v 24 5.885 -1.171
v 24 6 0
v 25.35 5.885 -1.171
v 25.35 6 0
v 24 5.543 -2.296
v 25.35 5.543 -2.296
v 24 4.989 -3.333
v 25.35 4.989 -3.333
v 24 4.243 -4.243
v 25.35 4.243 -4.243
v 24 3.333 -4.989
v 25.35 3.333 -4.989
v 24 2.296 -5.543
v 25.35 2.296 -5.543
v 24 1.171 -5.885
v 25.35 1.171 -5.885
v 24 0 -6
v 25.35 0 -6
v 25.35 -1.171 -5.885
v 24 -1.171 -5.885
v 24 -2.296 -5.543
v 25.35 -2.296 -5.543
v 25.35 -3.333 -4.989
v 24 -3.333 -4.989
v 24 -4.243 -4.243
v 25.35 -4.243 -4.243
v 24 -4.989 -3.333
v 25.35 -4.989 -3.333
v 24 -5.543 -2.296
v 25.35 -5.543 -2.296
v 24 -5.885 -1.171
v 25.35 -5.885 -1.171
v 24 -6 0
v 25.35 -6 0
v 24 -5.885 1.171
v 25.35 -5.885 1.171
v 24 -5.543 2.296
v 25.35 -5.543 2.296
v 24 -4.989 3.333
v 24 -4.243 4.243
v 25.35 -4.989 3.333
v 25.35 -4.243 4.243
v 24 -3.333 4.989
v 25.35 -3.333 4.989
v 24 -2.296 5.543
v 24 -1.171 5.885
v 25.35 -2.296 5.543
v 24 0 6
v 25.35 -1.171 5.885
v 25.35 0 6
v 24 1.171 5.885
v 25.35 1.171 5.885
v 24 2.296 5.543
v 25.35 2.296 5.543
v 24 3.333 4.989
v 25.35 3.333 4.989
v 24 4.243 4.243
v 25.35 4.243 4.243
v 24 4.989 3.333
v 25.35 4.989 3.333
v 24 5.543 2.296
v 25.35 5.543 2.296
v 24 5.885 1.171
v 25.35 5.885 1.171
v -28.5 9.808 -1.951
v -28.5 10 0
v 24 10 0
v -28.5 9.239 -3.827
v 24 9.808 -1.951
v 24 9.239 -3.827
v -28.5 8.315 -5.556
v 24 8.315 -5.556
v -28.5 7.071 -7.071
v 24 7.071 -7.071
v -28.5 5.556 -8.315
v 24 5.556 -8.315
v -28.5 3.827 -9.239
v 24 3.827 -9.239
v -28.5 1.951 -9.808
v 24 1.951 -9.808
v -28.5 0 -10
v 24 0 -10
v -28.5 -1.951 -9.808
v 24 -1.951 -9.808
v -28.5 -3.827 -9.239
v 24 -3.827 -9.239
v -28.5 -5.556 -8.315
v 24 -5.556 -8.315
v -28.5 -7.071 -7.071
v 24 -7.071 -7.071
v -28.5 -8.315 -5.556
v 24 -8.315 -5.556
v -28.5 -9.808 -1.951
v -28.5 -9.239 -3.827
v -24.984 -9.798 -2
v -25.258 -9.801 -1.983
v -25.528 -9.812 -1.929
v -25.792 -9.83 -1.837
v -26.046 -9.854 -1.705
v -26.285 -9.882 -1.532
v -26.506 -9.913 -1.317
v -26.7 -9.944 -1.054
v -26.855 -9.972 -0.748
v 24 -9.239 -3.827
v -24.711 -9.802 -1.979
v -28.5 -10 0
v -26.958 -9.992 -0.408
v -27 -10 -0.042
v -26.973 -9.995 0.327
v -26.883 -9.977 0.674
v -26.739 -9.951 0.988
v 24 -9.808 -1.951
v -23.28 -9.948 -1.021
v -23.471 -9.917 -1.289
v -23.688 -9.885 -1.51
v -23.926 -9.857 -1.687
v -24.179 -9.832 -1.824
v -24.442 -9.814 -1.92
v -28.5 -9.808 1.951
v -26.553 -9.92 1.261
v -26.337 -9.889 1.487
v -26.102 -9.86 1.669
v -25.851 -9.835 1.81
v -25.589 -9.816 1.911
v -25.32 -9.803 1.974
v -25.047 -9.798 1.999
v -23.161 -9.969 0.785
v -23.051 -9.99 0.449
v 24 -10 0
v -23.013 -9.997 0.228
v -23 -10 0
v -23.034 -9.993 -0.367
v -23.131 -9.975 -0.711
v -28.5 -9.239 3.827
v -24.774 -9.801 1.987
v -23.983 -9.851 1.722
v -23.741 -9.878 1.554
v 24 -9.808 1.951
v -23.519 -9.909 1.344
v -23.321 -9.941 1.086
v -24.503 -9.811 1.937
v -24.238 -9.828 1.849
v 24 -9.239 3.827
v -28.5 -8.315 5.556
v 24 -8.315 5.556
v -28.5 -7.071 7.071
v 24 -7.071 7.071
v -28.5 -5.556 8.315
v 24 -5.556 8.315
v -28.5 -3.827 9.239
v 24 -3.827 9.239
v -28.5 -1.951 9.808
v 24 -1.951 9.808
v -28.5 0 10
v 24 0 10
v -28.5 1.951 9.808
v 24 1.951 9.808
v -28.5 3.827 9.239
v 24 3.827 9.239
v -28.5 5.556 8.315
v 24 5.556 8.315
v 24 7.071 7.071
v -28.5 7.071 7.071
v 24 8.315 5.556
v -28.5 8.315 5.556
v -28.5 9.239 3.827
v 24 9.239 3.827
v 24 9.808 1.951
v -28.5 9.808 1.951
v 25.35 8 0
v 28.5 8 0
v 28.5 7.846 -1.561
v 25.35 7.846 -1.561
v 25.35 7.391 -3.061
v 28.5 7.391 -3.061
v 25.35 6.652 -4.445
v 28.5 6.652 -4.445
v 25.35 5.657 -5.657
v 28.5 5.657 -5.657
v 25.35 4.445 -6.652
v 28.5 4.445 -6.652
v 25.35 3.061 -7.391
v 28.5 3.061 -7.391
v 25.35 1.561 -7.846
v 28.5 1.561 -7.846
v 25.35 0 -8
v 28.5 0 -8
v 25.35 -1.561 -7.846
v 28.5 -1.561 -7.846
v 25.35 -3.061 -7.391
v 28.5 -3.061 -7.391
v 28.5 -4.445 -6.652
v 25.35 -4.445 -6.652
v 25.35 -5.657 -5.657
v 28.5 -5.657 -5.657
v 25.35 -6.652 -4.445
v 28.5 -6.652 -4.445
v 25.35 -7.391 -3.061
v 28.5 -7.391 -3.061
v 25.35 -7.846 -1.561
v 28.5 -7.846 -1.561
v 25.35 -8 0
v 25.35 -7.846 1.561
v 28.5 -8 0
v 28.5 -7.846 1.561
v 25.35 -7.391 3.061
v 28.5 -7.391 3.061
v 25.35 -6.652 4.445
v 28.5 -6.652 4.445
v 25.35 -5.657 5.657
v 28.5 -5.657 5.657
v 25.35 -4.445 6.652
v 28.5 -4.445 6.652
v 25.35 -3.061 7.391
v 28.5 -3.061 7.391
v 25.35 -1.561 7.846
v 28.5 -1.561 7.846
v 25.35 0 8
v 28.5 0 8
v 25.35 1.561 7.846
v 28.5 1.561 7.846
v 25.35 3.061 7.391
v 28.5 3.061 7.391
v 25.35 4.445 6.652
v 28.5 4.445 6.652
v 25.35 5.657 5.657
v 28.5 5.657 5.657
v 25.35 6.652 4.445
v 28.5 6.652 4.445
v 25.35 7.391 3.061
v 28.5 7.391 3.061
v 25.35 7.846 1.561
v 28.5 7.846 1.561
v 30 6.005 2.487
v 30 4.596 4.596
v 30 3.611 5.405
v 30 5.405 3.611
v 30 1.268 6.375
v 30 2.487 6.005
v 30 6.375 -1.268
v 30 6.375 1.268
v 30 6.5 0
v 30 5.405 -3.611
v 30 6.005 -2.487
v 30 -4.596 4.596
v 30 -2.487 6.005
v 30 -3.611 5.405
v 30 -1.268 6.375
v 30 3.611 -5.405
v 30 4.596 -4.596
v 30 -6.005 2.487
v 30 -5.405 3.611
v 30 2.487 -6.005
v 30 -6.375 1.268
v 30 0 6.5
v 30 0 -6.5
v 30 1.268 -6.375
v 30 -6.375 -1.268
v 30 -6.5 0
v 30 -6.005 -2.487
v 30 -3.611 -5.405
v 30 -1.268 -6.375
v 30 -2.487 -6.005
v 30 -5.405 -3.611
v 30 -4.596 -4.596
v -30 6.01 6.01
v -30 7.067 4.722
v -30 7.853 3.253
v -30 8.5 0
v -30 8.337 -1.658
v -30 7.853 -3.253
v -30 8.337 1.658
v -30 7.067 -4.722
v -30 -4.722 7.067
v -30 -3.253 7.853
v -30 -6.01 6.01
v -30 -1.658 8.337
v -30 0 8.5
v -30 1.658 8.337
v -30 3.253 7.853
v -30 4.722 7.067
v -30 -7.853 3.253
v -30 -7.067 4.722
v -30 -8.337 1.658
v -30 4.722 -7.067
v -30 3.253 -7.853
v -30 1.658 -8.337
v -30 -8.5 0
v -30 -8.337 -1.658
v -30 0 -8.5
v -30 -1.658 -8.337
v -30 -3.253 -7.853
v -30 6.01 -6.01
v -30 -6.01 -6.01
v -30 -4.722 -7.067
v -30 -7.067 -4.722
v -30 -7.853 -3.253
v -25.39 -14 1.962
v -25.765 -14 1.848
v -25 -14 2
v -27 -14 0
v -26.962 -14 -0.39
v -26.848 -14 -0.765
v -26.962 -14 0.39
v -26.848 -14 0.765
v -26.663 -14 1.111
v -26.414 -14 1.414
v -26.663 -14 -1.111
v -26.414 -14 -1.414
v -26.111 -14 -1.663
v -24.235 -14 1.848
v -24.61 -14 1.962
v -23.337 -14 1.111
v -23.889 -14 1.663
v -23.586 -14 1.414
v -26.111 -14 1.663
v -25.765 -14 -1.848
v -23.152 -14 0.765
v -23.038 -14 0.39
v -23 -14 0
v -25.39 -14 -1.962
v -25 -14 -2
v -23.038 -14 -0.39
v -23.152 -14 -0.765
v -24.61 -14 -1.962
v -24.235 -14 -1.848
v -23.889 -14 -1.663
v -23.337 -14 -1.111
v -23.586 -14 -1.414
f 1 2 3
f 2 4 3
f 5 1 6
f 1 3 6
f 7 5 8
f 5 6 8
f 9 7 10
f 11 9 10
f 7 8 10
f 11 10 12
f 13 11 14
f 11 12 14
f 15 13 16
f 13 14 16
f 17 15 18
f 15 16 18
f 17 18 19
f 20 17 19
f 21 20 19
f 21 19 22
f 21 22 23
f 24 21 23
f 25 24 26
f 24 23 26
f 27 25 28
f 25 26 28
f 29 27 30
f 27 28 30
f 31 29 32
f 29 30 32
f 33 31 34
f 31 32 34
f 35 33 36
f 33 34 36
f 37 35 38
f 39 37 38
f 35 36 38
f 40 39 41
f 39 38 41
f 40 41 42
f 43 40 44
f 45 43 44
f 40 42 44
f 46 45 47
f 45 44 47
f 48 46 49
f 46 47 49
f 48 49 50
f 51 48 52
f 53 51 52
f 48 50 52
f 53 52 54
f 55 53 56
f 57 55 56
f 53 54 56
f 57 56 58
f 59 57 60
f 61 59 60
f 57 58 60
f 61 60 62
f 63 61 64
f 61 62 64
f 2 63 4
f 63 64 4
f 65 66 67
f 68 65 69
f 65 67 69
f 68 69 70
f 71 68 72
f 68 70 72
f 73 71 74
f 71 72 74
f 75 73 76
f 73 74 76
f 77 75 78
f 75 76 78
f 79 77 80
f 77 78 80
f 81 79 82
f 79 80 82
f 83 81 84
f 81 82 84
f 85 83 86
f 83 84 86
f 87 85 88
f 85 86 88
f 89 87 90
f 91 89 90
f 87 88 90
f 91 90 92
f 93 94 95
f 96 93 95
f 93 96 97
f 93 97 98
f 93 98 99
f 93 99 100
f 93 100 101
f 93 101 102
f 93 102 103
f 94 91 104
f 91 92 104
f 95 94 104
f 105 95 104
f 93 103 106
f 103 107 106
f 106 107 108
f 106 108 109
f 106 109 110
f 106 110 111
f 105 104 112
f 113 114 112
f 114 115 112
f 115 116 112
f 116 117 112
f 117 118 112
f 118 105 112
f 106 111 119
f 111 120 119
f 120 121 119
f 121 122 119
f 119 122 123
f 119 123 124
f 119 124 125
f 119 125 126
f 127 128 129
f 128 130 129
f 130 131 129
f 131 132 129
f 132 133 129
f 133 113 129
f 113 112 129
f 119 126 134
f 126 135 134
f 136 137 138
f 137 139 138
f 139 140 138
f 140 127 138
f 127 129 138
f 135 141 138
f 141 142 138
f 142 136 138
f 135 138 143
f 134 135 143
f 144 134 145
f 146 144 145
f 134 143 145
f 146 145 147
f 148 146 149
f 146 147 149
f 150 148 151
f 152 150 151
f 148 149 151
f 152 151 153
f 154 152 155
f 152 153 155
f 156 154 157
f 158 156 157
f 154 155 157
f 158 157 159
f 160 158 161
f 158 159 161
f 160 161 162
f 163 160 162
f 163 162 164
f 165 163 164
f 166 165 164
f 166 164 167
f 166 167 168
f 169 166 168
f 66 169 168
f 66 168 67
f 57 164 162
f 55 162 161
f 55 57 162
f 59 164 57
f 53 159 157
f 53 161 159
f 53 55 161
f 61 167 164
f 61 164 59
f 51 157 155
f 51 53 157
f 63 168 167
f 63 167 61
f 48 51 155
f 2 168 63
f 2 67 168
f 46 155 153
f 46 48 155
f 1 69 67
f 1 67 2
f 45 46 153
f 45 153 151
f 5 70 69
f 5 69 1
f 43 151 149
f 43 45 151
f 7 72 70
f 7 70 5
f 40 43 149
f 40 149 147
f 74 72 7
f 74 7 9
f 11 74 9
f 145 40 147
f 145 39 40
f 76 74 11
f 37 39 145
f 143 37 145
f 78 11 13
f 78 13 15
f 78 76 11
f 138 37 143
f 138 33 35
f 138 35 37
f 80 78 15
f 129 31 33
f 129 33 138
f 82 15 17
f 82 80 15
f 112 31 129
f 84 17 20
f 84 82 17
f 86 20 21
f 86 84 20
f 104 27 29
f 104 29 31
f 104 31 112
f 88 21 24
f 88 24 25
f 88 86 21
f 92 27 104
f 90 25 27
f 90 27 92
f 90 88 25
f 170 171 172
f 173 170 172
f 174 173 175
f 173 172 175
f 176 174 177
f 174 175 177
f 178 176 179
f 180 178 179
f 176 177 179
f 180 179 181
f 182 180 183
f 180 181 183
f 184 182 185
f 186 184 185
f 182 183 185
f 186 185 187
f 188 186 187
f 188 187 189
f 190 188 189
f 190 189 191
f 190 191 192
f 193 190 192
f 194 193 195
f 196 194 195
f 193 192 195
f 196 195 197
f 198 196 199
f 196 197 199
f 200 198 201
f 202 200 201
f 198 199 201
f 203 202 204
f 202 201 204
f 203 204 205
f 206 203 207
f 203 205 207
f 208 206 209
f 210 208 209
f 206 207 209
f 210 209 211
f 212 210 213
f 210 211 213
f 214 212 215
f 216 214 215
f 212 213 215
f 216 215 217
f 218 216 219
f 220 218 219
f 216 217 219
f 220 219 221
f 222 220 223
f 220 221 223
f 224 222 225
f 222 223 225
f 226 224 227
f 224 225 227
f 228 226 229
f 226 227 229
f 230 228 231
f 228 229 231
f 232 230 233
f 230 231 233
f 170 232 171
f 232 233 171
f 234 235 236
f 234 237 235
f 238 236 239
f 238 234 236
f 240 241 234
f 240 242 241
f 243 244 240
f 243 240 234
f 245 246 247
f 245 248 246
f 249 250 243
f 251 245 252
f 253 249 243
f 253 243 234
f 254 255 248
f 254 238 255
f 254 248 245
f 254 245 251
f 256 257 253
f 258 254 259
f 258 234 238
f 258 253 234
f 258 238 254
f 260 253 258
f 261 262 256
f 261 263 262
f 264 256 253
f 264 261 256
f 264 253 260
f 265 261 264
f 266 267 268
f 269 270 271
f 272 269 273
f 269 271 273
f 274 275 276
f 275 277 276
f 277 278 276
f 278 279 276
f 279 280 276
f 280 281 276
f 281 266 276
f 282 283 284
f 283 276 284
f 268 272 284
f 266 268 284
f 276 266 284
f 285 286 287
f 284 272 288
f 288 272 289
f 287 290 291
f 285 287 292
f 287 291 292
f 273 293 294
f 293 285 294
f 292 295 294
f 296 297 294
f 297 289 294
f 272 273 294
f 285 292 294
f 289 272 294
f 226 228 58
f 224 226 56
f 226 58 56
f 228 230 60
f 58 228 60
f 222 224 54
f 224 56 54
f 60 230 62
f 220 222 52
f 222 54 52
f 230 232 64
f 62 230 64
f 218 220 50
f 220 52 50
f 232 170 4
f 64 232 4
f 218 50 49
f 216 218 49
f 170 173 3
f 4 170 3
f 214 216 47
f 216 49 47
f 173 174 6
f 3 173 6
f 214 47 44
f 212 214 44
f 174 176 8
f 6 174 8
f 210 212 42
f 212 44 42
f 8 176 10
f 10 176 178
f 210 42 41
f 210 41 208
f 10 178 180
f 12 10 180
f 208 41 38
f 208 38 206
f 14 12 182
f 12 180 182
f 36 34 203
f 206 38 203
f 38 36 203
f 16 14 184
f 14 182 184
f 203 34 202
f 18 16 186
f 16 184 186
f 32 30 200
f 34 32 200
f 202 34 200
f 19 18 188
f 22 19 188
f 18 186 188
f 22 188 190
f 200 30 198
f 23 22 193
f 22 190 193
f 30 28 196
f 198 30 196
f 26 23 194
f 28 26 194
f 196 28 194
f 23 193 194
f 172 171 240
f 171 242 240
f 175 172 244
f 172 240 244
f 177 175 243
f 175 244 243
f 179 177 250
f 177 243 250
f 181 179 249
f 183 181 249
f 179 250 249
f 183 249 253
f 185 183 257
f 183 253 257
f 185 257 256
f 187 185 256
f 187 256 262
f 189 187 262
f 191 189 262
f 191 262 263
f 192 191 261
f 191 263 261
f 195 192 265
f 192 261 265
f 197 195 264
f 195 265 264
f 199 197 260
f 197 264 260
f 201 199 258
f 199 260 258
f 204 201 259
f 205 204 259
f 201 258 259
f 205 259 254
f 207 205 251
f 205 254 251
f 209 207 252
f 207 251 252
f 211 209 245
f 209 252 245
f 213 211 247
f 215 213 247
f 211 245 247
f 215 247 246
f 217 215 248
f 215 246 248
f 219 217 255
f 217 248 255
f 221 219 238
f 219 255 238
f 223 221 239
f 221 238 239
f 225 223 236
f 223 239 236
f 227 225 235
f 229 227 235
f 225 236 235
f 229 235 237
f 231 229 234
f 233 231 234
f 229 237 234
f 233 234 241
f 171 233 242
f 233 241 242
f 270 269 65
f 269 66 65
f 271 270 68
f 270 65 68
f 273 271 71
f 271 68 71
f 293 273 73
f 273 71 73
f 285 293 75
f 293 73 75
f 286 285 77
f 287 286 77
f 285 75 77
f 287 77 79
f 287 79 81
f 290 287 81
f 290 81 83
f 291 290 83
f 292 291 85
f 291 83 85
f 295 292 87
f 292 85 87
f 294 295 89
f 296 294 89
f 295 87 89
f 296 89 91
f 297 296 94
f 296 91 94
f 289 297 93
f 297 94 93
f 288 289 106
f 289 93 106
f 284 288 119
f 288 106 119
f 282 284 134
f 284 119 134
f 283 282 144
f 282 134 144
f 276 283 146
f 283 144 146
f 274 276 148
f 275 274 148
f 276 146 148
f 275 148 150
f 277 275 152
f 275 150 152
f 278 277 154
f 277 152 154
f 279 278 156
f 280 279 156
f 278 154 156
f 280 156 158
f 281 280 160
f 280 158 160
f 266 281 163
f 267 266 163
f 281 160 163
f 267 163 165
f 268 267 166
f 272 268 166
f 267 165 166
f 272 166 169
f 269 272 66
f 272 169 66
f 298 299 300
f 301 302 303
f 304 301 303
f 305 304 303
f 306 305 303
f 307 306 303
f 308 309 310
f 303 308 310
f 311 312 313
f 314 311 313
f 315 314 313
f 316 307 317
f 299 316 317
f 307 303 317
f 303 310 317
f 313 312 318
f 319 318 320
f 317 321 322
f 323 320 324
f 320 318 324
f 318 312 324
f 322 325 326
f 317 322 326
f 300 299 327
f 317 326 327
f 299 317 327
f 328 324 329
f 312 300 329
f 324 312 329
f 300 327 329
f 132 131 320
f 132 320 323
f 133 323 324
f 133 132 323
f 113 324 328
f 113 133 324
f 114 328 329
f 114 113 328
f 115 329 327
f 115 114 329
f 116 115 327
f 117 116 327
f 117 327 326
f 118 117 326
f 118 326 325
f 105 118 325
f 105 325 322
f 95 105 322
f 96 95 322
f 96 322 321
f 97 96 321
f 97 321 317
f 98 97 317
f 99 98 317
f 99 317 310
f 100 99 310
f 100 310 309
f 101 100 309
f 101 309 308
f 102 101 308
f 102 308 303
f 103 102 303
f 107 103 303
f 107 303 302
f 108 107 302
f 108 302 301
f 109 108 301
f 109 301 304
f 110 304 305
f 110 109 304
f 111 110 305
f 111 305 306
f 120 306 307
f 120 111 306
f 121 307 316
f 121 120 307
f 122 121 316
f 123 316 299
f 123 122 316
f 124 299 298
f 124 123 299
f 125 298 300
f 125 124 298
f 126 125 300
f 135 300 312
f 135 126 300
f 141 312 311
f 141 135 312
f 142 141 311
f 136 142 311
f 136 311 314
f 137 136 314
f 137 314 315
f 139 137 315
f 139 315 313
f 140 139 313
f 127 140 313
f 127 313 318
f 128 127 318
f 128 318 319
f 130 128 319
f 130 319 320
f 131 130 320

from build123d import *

# Parameters (mm, degrees)
SKETCH1_W           = 54
SKETCH1_H           = 10
SKETCH3_R           = 2
BOSS_EXTRUDE1_DEPTH = 14
SKETCH4_W           = 6
SKETCH4_H           = 8
SKETCH5_W           = 1.35
SKETCH5_H           = 2


with BuildPart() as part:
    # Sketch1 → Revolve1 (revolve)
    with BuildSketch(Plane.XY):
        with Locations((-3, 5)):
            Rectangle(SKETCH1_W, SKETCH1_H)
    revolve(axis=Axis((24, 0, 0), (-1, 0, 0)))

    # Sketch2 → Cut-Revolve1 (revolve, cut)
    with BuildSketch(Plane.XY):
        Polygon((-30, 8.5), (-28.5, 10), (-30, 10), align=None)
    revolve(axis=Axis((49, 0, 0), (-1, 0, 0)), mode=Mode.SUBTRACT)

    # Sketch3 → Boss-Extrude1 (add)
    with BuildSketch(Plane(origin=(0, 0, 0), x_dir=(1, 0, 0), z_dir=(0, 1, 0))):
        with Locations((-25, 0)):
            Circle(SKETCH3_R)
    extrude(amount=-BOSS_EXTRUDE1_DEPTH)

    # Sketch4 → Revolve2 (revolve)
    with BuildSketch(Plane.XY):
        with Locations((27, 4)):
            Rectangle(SKETCH4_W, SKETCH4_H)
    revolve(axis=Axis((30, 0, 0), (-1, 0, 0)))

    # Sketch5 → Cut-Revolve2 (revolve, cut)
    with BuildSketch(Plane.XY):
        with Locations((24.675, 7)):
            Rectangle(SKETCH5_W, SKETCH5_H)
    revolve(axis=Axis((49, 0, 0), (-1, 0, 0)), mode=Mode.SUBTRACT)

    # Sketch6 → Cut-Revolve3 (revolve, cut)
    with BuildSketch(Plane.XY):
        Polygon((28.5, 8), (30, 6.5), (30, 8), align=None)
    revolve(axis=Axis((49, 0, 0), (-1, 0, 0)), mode=Mode.SUBTRACT)


solid = part.part
